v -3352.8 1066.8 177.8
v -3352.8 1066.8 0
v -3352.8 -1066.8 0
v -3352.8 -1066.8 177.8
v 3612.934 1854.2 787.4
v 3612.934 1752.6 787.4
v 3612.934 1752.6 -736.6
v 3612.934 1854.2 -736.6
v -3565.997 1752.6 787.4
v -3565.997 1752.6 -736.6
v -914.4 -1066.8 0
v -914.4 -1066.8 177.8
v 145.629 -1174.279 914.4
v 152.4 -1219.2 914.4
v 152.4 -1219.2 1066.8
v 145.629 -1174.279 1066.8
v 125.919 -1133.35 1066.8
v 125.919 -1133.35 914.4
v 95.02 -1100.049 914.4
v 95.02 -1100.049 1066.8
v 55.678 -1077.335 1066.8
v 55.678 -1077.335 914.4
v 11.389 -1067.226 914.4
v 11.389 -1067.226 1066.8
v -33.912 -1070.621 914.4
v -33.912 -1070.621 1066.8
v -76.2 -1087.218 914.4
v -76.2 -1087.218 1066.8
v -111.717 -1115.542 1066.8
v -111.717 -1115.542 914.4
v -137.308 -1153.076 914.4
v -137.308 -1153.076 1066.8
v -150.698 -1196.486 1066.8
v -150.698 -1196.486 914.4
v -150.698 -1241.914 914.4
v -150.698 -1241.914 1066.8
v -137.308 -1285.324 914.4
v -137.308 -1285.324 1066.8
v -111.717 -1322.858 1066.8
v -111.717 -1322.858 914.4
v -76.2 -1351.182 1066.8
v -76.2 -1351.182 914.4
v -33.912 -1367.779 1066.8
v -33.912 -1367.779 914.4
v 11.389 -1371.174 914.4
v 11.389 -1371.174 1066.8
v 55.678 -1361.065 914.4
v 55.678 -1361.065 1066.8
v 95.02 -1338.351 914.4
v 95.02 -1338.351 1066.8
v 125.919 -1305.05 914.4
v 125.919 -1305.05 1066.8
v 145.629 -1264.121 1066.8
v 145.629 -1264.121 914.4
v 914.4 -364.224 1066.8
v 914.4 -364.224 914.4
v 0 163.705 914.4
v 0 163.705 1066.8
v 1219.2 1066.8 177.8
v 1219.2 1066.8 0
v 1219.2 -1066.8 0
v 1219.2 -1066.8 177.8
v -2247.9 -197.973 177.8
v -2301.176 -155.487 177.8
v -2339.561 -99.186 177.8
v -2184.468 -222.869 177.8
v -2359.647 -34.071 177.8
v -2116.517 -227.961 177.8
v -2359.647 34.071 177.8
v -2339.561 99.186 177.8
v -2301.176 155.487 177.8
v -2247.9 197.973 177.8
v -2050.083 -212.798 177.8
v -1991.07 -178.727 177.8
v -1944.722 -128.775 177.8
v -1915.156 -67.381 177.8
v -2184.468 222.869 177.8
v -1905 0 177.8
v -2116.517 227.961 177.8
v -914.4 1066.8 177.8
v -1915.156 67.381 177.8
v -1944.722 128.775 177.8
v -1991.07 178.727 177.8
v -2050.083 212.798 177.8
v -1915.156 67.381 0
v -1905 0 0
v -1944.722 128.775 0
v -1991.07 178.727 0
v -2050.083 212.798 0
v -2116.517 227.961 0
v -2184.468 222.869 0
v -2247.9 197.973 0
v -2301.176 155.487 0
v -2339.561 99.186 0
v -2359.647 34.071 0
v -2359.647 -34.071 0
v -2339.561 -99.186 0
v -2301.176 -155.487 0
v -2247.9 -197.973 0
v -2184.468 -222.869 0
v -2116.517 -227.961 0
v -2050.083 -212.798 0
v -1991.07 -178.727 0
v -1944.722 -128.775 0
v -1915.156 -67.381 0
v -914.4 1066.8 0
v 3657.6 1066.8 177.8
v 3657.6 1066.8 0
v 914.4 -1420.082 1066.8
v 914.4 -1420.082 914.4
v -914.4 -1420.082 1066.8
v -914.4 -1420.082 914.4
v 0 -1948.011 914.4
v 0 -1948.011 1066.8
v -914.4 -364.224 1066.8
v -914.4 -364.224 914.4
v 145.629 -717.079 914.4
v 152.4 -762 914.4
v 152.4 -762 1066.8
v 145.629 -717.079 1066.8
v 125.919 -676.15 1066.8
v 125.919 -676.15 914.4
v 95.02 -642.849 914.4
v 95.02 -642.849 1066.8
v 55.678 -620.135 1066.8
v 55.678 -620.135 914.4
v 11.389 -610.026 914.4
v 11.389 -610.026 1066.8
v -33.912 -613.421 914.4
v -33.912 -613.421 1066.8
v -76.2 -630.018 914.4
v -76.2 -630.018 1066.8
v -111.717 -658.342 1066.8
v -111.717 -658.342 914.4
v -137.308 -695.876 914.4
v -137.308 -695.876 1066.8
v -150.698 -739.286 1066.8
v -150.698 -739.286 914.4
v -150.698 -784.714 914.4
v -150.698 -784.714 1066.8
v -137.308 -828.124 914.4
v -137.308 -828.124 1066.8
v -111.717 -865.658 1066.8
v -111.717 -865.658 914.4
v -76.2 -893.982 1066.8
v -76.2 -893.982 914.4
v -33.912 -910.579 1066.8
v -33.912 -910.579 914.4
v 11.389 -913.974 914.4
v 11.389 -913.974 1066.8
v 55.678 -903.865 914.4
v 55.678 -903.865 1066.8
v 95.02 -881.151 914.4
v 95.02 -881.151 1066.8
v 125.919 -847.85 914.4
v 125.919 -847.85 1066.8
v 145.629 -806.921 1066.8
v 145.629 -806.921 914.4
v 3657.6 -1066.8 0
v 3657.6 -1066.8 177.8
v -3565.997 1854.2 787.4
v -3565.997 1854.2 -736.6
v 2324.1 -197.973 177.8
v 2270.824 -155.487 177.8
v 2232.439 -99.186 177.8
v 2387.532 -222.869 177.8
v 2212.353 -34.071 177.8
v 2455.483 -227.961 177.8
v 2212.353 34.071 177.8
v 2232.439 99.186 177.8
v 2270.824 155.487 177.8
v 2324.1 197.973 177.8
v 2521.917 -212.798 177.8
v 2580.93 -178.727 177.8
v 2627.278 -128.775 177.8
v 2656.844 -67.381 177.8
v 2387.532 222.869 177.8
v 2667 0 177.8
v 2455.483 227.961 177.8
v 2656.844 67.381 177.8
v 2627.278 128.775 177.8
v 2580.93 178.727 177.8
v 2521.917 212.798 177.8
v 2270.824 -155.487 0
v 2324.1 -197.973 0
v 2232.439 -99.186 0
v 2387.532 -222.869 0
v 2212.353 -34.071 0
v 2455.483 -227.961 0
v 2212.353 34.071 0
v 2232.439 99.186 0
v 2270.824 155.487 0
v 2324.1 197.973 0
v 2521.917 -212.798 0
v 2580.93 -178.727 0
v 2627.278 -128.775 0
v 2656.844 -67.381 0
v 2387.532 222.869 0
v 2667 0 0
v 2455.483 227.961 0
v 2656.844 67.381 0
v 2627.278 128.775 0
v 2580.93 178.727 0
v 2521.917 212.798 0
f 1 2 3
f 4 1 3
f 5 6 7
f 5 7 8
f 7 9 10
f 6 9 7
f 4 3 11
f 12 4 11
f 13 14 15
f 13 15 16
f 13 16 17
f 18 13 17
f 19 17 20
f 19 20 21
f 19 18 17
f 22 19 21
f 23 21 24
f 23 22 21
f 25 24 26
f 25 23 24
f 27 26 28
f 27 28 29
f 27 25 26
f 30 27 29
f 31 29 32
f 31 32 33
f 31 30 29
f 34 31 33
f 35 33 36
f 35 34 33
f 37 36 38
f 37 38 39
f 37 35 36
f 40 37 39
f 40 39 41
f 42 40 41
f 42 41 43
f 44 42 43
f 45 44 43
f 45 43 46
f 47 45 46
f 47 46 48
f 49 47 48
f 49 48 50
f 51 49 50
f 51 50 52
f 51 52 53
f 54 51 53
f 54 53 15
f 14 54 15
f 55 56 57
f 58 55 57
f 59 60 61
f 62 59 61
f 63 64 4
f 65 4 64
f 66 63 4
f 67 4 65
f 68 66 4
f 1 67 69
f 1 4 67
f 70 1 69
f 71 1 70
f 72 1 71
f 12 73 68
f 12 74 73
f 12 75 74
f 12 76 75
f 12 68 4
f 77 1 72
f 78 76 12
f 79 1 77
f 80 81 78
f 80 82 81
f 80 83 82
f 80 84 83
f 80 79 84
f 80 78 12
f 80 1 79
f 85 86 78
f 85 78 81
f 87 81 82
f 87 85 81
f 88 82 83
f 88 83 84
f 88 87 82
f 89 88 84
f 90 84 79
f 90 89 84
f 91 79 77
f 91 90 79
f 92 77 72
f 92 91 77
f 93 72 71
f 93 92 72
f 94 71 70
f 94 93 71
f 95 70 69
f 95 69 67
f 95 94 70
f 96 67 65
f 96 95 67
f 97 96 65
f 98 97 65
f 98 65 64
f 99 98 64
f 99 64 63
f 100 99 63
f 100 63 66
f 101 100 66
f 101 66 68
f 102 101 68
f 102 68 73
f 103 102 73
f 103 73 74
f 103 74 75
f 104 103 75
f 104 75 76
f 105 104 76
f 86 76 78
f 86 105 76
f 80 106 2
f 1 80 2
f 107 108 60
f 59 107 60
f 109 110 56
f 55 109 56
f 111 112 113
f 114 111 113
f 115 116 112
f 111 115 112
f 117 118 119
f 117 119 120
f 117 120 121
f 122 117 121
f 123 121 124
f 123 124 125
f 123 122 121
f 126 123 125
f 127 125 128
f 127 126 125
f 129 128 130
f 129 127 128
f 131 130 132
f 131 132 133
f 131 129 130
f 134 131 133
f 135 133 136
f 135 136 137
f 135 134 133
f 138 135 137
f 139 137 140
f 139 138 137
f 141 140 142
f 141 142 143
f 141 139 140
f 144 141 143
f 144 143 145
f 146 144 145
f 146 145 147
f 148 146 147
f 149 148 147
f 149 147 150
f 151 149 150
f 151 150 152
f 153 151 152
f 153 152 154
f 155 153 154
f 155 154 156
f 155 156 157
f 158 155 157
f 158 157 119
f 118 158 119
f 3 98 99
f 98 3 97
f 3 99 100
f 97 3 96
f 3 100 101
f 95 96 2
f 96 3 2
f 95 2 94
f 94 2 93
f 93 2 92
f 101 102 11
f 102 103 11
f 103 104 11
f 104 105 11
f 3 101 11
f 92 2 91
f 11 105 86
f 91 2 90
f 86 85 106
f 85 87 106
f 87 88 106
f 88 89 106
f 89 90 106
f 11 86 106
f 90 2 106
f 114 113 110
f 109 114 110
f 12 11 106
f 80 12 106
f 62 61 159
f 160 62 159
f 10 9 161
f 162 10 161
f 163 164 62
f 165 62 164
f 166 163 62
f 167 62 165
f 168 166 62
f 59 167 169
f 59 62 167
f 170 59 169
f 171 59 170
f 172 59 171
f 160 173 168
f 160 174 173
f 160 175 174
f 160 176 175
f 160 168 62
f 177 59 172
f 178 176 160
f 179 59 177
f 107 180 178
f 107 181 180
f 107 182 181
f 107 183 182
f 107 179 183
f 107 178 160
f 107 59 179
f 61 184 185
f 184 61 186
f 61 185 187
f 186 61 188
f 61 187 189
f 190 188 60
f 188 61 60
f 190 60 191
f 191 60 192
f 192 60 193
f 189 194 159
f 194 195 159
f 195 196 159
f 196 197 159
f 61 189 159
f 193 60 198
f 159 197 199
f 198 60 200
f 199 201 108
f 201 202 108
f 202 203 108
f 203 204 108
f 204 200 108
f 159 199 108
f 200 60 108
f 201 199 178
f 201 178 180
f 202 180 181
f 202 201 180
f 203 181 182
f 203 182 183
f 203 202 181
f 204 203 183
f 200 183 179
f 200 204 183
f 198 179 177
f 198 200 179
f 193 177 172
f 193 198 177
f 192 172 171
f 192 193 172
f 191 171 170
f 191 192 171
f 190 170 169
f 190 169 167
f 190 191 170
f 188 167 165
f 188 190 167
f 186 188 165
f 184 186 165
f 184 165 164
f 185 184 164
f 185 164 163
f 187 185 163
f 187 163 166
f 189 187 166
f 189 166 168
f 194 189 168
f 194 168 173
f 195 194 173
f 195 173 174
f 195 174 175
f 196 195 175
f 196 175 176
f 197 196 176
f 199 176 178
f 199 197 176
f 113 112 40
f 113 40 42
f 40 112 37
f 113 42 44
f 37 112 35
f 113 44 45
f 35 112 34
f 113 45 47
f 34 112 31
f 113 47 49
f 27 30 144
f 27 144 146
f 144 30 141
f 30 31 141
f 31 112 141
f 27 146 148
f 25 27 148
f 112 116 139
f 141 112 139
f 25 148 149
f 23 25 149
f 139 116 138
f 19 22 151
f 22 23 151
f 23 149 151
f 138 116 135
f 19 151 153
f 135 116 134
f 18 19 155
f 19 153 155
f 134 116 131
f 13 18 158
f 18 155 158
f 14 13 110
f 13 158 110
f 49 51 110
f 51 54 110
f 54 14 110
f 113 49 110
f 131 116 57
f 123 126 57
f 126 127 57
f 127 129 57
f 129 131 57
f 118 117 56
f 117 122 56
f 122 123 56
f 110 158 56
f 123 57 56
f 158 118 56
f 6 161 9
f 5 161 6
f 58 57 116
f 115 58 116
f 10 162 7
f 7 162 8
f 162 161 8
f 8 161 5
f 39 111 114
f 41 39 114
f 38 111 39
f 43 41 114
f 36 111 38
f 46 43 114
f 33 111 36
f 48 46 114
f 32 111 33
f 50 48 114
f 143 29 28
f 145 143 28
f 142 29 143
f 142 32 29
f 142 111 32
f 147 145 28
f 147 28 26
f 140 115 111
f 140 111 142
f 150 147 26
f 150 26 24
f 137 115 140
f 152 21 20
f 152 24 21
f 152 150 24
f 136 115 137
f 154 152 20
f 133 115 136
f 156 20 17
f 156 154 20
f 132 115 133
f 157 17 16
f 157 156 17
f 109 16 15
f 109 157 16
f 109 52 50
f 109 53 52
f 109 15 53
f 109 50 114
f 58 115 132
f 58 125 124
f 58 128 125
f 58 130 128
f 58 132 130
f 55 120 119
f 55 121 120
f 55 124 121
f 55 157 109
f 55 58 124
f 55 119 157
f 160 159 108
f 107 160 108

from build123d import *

# Parameters (mm, degrees)
F0_R          = 228.6
F0_W          = 545.1920032501
F0_H          = 1898.5517024994
F2_DEPTH      = 177.8
F0_W_2        = 1524
F0_H_2        = 711.2
F0_R_2        = 152.4
F4_DEPTH      = 1066.8
F5_DEPTH      = 914.4
F0_W_3        = 7178.9307594299
F0_H_3        = 101.6
F6_DEPTH      = 787.4
F6_DEPTH_BACK = 736.6


# Not quite as in the source:
# - the program builds the solid bodies; features that only make, move or delete a surface that nothing else refers to are left out


with BuildPart() as f2:
    # F0 (on Top) → F2 (new body)
    with BuildSketch(Plane.XY):
        Polygon((1219.2, 304.8), (1219.2, -484.2192232609), (1219.2, -997.4917173386), (1219.2, -1066.8), (3657.6, -1066.8), (3657.6, 1066.8), (1219.2, 1066.8), (1219.2, 914.4), align=None)
        with Locations((2438.4, 0)):
            Circle(F0_R, mode=Mode.SUBTRACT)
        with Locations((2988.1635904312, 5.0233006477)):
            Rectangle(F0_W, F0_H, mode=Mode.SUBTRACT)
        with Locations((2988.1635904312, 5.0233006477)):
            Rectangle(F0_W, F0_H)
    extrude(amount=F2_DEPTH)


with BuildPart() as f2b:
    # F0 (on Top) → F2, piece 2 (new body)
    with BuildSketch(Plane.XY):
        Polygon((-914.4, -1066.8), (-914.4, -364.223748142), (-914.4, 304.8), (-914.4, 914.4), (-914.4, 1066.8), (-3352.8, 1066.8), (-3352.8, -1066.8), align=None)
        with Locations((-2133.6, 0)):
            Circle(F0_R, mode=Mode.SUBTRACT)
        with Locations((-2186.1399059296, 679.8987394333)):
            Rectangle(F0_W_2, F0_H_2, mode=Mode.SUBTRACT)
        with Locations((-2186.1399059296, 679.8987394333)):
            Rectangle(F0_W_2, F0_H_2)
    extrude(amount=F2_DEPTH)


with BuildPart() as f4:
    # F0 (on Top) → F4 (new body)
    with BuildSketch(Plane.XY):
        Polygon((914.4, -364.223748142), (0, 163.705338005), (-914.4, -364.223748142), (-914.4, -1066.8), (-914.4, -1420.081920436), (0, -1948.011006583), (914.4, -1420.081920436), (914.4, -997.4917173386), (914.4, -484.2192232609), align=None)
        with Locations((0, -1219.2)):
            Circle(F0_R_2, mode=Mode.SUBTRACT)
        with Locations((0, -762)):
            Circle(F0_R_2, mode=Mode.SUBTRACT)
    extrude(amount=F4_DEPTH)

    # F0 (on Top) → F5 (cut)
    with BuildSketch(Plane.XY):
        Polygon((914.4, -364.223748142), (0, 163.705338005), (-914.4, -364.223748142), (-914.4, -1066.8), (-914.4, -1420.081920436), (0, -1948.011006583), (914.4, -1420.081920436), (914.4, -997.4917173386), (914.4, -484.2192232609), align=None)
        with Locations((0, -1219.2)):
            Circle(F0_R_2, mode=Mode.SUBTRACT)
        with Locations((0, -762)):
            Circle(F0_R_2, mode=Mode.SUBTRACT)
    extrude(amount=F5_DEPTH, mode=Mode.SUBTRACT)


with BuildPart() as f6:
    # F0 (on Top) → F6 (new body, two sides)
    with BuildSketch(Plane.XY) as f6_sk:
        with Locations((23.4687328339, 1803.4)):
            Rectangle(F0_W_3, F0_H_3)
    extrude(amount=F6_DEPTH)
    extrude(f6_sk.sketch, amount=-F6_DEPTH_BACK)


solid = Compound([f2.part, f2b.part, f4.part, f6.part])
